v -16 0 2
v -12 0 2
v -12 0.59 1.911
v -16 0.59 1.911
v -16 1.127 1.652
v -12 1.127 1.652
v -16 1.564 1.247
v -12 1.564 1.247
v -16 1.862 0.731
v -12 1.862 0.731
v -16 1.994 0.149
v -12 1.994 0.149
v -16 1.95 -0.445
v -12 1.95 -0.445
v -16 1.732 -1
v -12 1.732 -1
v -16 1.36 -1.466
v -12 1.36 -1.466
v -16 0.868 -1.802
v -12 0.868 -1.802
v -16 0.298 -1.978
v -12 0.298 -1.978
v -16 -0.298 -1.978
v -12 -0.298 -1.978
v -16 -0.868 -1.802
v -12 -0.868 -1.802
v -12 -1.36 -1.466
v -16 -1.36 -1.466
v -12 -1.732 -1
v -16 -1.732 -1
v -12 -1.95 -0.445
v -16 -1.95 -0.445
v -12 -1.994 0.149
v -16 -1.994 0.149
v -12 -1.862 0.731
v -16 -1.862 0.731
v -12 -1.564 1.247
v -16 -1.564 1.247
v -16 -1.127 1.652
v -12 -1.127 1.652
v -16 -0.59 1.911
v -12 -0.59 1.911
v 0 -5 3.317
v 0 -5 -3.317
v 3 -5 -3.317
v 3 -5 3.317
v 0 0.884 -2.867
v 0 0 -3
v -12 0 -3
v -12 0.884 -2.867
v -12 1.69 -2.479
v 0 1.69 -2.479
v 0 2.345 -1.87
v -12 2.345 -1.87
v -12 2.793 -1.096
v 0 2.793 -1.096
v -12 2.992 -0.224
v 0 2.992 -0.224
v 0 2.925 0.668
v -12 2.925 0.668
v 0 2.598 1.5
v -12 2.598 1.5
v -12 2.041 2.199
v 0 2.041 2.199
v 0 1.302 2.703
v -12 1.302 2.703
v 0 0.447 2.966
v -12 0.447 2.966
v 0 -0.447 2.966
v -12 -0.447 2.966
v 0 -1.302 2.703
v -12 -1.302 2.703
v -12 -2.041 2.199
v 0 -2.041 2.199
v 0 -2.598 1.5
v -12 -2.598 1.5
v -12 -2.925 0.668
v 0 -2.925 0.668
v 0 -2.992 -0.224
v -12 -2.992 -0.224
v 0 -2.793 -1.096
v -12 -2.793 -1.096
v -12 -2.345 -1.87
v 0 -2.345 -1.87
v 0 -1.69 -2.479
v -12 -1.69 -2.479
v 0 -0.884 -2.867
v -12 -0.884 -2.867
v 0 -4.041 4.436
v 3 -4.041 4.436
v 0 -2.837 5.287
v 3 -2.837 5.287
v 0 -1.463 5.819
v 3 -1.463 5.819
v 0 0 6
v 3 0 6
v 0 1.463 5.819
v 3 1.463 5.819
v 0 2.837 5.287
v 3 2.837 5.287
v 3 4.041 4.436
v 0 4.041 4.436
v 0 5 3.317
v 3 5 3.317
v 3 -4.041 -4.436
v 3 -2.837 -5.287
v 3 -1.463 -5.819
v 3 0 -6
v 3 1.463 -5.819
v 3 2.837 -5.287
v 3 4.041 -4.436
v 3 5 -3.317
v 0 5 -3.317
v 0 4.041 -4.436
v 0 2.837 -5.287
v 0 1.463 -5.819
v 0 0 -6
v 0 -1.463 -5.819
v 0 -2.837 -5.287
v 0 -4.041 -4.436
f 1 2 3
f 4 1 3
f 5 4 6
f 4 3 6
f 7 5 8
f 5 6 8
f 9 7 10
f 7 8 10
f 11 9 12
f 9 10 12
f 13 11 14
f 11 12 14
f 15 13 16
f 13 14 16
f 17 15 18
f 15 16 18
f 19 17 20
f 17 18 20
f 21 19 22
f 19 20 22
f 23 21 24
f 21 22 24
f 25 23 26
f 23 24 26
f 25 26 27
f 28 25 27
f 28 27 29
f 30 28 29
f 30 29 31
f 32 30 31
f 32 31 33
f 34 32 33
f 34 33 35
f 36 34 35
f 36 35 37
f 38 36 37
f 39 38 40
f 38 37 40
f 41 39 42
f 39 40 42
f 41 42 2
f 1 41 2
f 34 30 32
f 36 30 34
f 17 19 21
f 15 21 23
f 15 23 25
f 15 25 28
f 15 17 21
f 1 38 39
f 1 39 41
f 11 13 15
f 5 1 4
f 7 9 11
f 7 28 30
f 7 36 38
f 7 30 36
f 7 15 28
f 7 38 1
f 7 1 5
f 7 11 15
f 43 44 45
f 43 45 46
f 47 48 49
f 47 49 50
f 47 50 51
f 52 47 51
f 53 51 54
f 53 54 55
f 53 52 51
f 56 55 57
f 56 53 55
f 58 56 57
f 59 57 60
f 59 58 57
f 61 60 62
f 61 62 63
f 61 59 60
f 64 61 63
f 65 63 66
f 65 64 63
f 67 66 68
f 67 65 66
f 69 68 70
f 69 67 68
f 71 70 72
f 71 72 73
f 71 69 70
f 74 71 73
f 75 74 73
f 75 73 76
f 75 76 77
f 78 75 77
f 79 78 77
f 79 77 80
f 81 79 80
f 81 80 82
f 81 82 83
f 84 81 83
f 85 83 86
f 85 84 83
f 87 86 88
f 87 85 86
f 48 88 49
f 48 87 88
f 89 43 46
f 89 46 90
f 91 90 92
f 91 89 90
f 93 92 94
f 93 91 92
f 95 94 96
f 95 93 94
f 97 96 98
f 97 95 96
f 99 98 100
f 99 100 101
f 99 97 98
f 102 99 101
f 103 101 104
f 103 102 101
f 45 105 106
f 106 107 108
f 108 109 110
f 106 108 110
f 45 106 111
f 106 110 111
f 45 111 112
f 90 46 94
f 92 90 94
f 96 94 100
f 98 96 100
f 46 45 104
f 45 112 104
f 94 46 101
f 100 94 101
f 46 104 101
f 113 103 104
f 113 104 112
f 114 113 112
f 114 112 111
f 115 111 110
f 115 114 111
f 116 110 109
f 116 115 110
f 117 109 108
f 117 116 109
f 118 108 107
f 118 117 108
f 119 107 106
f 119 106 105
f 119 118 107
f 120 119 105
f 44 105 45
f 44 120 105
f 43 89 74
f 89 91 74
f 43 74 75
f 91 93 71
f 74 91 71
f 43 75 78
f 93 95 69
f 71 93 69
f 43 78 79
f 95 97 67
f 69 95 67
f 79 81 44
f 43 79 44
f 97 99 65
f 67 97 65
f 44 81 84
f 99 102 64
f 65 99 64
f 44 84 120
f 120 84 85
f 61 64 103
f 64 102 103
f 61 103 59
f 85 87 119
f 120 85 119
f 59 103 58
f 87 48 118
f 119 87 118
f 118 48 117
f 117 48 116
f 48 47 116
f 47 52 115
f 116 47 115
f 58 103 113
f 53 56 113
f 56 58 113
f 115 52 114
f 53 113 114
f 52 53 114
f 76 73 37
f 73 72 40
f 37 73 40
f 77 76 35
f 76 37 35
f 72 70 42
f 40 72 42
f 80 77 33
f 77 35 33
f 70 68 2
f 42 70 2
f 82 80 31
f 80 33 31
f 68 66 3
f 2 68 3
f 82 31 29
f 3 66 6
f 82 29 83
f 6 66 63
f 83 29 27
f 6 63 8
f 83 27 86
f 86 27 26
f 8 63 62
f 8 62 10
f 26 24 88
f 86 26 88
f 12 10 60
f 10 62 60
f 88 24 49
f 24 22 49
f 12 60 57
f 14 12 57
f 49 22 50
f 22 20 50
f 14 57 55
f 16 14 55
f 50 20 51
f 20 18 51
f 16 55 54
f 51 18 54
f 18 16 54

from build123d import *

# Parameters (mm, degrees)
BOSS_EXTRUDE1_DEPTH = 3
SKETCH2_3_R         = 3
BOSS_EXTRUDE2_DEPTH = 12
SKETCH3_R           = 2
BOSS_EXTRUDE3_DEPTH = 4


with BuildPart() as part:
    # Sketch2 → Boss-Extrude1 (new body)
    with BuildSketch(Plane(origin=(0, 0, 0), x_dir=(0, 0, -1), z_dir=(1, 0, 0))):
        with BuildLine():
            ThreePointArc((3.31662479, -5), (6, 0), (3.31662479, 5))
            Line((3.31662479, 5), (-3.31662479, 5))
            ThreePointArc((-3.31662479, 5), (-6, 0), (-3.31662479, -5))
            Line((-3.31662479, -5), (3.31662479, -5))
        make_face()
    extrude(amount=BOSS_EXTRUDE1_DEPTH)

    # Sketch2<3> → Boss-Extrude2 (add)
    with BuildSketch(Plane(origin=(0, 0, 0), x_dir=(0, 0, -1), z_dir=(1, 0, 0))):
        Circle(SKETCH2_3_R)
    extrude(amount=-BOSS_EXTRUDE2_DEPTH)

    # Sketch3 → Boss-Extrude3 (add)
    with BuildSketch(Plane.ZY.offset(12)):
        Circle(SKETCH3_R)
    extrude(amount=BOSS_EXTRUDE3_DEPTH)


solid = part.part
